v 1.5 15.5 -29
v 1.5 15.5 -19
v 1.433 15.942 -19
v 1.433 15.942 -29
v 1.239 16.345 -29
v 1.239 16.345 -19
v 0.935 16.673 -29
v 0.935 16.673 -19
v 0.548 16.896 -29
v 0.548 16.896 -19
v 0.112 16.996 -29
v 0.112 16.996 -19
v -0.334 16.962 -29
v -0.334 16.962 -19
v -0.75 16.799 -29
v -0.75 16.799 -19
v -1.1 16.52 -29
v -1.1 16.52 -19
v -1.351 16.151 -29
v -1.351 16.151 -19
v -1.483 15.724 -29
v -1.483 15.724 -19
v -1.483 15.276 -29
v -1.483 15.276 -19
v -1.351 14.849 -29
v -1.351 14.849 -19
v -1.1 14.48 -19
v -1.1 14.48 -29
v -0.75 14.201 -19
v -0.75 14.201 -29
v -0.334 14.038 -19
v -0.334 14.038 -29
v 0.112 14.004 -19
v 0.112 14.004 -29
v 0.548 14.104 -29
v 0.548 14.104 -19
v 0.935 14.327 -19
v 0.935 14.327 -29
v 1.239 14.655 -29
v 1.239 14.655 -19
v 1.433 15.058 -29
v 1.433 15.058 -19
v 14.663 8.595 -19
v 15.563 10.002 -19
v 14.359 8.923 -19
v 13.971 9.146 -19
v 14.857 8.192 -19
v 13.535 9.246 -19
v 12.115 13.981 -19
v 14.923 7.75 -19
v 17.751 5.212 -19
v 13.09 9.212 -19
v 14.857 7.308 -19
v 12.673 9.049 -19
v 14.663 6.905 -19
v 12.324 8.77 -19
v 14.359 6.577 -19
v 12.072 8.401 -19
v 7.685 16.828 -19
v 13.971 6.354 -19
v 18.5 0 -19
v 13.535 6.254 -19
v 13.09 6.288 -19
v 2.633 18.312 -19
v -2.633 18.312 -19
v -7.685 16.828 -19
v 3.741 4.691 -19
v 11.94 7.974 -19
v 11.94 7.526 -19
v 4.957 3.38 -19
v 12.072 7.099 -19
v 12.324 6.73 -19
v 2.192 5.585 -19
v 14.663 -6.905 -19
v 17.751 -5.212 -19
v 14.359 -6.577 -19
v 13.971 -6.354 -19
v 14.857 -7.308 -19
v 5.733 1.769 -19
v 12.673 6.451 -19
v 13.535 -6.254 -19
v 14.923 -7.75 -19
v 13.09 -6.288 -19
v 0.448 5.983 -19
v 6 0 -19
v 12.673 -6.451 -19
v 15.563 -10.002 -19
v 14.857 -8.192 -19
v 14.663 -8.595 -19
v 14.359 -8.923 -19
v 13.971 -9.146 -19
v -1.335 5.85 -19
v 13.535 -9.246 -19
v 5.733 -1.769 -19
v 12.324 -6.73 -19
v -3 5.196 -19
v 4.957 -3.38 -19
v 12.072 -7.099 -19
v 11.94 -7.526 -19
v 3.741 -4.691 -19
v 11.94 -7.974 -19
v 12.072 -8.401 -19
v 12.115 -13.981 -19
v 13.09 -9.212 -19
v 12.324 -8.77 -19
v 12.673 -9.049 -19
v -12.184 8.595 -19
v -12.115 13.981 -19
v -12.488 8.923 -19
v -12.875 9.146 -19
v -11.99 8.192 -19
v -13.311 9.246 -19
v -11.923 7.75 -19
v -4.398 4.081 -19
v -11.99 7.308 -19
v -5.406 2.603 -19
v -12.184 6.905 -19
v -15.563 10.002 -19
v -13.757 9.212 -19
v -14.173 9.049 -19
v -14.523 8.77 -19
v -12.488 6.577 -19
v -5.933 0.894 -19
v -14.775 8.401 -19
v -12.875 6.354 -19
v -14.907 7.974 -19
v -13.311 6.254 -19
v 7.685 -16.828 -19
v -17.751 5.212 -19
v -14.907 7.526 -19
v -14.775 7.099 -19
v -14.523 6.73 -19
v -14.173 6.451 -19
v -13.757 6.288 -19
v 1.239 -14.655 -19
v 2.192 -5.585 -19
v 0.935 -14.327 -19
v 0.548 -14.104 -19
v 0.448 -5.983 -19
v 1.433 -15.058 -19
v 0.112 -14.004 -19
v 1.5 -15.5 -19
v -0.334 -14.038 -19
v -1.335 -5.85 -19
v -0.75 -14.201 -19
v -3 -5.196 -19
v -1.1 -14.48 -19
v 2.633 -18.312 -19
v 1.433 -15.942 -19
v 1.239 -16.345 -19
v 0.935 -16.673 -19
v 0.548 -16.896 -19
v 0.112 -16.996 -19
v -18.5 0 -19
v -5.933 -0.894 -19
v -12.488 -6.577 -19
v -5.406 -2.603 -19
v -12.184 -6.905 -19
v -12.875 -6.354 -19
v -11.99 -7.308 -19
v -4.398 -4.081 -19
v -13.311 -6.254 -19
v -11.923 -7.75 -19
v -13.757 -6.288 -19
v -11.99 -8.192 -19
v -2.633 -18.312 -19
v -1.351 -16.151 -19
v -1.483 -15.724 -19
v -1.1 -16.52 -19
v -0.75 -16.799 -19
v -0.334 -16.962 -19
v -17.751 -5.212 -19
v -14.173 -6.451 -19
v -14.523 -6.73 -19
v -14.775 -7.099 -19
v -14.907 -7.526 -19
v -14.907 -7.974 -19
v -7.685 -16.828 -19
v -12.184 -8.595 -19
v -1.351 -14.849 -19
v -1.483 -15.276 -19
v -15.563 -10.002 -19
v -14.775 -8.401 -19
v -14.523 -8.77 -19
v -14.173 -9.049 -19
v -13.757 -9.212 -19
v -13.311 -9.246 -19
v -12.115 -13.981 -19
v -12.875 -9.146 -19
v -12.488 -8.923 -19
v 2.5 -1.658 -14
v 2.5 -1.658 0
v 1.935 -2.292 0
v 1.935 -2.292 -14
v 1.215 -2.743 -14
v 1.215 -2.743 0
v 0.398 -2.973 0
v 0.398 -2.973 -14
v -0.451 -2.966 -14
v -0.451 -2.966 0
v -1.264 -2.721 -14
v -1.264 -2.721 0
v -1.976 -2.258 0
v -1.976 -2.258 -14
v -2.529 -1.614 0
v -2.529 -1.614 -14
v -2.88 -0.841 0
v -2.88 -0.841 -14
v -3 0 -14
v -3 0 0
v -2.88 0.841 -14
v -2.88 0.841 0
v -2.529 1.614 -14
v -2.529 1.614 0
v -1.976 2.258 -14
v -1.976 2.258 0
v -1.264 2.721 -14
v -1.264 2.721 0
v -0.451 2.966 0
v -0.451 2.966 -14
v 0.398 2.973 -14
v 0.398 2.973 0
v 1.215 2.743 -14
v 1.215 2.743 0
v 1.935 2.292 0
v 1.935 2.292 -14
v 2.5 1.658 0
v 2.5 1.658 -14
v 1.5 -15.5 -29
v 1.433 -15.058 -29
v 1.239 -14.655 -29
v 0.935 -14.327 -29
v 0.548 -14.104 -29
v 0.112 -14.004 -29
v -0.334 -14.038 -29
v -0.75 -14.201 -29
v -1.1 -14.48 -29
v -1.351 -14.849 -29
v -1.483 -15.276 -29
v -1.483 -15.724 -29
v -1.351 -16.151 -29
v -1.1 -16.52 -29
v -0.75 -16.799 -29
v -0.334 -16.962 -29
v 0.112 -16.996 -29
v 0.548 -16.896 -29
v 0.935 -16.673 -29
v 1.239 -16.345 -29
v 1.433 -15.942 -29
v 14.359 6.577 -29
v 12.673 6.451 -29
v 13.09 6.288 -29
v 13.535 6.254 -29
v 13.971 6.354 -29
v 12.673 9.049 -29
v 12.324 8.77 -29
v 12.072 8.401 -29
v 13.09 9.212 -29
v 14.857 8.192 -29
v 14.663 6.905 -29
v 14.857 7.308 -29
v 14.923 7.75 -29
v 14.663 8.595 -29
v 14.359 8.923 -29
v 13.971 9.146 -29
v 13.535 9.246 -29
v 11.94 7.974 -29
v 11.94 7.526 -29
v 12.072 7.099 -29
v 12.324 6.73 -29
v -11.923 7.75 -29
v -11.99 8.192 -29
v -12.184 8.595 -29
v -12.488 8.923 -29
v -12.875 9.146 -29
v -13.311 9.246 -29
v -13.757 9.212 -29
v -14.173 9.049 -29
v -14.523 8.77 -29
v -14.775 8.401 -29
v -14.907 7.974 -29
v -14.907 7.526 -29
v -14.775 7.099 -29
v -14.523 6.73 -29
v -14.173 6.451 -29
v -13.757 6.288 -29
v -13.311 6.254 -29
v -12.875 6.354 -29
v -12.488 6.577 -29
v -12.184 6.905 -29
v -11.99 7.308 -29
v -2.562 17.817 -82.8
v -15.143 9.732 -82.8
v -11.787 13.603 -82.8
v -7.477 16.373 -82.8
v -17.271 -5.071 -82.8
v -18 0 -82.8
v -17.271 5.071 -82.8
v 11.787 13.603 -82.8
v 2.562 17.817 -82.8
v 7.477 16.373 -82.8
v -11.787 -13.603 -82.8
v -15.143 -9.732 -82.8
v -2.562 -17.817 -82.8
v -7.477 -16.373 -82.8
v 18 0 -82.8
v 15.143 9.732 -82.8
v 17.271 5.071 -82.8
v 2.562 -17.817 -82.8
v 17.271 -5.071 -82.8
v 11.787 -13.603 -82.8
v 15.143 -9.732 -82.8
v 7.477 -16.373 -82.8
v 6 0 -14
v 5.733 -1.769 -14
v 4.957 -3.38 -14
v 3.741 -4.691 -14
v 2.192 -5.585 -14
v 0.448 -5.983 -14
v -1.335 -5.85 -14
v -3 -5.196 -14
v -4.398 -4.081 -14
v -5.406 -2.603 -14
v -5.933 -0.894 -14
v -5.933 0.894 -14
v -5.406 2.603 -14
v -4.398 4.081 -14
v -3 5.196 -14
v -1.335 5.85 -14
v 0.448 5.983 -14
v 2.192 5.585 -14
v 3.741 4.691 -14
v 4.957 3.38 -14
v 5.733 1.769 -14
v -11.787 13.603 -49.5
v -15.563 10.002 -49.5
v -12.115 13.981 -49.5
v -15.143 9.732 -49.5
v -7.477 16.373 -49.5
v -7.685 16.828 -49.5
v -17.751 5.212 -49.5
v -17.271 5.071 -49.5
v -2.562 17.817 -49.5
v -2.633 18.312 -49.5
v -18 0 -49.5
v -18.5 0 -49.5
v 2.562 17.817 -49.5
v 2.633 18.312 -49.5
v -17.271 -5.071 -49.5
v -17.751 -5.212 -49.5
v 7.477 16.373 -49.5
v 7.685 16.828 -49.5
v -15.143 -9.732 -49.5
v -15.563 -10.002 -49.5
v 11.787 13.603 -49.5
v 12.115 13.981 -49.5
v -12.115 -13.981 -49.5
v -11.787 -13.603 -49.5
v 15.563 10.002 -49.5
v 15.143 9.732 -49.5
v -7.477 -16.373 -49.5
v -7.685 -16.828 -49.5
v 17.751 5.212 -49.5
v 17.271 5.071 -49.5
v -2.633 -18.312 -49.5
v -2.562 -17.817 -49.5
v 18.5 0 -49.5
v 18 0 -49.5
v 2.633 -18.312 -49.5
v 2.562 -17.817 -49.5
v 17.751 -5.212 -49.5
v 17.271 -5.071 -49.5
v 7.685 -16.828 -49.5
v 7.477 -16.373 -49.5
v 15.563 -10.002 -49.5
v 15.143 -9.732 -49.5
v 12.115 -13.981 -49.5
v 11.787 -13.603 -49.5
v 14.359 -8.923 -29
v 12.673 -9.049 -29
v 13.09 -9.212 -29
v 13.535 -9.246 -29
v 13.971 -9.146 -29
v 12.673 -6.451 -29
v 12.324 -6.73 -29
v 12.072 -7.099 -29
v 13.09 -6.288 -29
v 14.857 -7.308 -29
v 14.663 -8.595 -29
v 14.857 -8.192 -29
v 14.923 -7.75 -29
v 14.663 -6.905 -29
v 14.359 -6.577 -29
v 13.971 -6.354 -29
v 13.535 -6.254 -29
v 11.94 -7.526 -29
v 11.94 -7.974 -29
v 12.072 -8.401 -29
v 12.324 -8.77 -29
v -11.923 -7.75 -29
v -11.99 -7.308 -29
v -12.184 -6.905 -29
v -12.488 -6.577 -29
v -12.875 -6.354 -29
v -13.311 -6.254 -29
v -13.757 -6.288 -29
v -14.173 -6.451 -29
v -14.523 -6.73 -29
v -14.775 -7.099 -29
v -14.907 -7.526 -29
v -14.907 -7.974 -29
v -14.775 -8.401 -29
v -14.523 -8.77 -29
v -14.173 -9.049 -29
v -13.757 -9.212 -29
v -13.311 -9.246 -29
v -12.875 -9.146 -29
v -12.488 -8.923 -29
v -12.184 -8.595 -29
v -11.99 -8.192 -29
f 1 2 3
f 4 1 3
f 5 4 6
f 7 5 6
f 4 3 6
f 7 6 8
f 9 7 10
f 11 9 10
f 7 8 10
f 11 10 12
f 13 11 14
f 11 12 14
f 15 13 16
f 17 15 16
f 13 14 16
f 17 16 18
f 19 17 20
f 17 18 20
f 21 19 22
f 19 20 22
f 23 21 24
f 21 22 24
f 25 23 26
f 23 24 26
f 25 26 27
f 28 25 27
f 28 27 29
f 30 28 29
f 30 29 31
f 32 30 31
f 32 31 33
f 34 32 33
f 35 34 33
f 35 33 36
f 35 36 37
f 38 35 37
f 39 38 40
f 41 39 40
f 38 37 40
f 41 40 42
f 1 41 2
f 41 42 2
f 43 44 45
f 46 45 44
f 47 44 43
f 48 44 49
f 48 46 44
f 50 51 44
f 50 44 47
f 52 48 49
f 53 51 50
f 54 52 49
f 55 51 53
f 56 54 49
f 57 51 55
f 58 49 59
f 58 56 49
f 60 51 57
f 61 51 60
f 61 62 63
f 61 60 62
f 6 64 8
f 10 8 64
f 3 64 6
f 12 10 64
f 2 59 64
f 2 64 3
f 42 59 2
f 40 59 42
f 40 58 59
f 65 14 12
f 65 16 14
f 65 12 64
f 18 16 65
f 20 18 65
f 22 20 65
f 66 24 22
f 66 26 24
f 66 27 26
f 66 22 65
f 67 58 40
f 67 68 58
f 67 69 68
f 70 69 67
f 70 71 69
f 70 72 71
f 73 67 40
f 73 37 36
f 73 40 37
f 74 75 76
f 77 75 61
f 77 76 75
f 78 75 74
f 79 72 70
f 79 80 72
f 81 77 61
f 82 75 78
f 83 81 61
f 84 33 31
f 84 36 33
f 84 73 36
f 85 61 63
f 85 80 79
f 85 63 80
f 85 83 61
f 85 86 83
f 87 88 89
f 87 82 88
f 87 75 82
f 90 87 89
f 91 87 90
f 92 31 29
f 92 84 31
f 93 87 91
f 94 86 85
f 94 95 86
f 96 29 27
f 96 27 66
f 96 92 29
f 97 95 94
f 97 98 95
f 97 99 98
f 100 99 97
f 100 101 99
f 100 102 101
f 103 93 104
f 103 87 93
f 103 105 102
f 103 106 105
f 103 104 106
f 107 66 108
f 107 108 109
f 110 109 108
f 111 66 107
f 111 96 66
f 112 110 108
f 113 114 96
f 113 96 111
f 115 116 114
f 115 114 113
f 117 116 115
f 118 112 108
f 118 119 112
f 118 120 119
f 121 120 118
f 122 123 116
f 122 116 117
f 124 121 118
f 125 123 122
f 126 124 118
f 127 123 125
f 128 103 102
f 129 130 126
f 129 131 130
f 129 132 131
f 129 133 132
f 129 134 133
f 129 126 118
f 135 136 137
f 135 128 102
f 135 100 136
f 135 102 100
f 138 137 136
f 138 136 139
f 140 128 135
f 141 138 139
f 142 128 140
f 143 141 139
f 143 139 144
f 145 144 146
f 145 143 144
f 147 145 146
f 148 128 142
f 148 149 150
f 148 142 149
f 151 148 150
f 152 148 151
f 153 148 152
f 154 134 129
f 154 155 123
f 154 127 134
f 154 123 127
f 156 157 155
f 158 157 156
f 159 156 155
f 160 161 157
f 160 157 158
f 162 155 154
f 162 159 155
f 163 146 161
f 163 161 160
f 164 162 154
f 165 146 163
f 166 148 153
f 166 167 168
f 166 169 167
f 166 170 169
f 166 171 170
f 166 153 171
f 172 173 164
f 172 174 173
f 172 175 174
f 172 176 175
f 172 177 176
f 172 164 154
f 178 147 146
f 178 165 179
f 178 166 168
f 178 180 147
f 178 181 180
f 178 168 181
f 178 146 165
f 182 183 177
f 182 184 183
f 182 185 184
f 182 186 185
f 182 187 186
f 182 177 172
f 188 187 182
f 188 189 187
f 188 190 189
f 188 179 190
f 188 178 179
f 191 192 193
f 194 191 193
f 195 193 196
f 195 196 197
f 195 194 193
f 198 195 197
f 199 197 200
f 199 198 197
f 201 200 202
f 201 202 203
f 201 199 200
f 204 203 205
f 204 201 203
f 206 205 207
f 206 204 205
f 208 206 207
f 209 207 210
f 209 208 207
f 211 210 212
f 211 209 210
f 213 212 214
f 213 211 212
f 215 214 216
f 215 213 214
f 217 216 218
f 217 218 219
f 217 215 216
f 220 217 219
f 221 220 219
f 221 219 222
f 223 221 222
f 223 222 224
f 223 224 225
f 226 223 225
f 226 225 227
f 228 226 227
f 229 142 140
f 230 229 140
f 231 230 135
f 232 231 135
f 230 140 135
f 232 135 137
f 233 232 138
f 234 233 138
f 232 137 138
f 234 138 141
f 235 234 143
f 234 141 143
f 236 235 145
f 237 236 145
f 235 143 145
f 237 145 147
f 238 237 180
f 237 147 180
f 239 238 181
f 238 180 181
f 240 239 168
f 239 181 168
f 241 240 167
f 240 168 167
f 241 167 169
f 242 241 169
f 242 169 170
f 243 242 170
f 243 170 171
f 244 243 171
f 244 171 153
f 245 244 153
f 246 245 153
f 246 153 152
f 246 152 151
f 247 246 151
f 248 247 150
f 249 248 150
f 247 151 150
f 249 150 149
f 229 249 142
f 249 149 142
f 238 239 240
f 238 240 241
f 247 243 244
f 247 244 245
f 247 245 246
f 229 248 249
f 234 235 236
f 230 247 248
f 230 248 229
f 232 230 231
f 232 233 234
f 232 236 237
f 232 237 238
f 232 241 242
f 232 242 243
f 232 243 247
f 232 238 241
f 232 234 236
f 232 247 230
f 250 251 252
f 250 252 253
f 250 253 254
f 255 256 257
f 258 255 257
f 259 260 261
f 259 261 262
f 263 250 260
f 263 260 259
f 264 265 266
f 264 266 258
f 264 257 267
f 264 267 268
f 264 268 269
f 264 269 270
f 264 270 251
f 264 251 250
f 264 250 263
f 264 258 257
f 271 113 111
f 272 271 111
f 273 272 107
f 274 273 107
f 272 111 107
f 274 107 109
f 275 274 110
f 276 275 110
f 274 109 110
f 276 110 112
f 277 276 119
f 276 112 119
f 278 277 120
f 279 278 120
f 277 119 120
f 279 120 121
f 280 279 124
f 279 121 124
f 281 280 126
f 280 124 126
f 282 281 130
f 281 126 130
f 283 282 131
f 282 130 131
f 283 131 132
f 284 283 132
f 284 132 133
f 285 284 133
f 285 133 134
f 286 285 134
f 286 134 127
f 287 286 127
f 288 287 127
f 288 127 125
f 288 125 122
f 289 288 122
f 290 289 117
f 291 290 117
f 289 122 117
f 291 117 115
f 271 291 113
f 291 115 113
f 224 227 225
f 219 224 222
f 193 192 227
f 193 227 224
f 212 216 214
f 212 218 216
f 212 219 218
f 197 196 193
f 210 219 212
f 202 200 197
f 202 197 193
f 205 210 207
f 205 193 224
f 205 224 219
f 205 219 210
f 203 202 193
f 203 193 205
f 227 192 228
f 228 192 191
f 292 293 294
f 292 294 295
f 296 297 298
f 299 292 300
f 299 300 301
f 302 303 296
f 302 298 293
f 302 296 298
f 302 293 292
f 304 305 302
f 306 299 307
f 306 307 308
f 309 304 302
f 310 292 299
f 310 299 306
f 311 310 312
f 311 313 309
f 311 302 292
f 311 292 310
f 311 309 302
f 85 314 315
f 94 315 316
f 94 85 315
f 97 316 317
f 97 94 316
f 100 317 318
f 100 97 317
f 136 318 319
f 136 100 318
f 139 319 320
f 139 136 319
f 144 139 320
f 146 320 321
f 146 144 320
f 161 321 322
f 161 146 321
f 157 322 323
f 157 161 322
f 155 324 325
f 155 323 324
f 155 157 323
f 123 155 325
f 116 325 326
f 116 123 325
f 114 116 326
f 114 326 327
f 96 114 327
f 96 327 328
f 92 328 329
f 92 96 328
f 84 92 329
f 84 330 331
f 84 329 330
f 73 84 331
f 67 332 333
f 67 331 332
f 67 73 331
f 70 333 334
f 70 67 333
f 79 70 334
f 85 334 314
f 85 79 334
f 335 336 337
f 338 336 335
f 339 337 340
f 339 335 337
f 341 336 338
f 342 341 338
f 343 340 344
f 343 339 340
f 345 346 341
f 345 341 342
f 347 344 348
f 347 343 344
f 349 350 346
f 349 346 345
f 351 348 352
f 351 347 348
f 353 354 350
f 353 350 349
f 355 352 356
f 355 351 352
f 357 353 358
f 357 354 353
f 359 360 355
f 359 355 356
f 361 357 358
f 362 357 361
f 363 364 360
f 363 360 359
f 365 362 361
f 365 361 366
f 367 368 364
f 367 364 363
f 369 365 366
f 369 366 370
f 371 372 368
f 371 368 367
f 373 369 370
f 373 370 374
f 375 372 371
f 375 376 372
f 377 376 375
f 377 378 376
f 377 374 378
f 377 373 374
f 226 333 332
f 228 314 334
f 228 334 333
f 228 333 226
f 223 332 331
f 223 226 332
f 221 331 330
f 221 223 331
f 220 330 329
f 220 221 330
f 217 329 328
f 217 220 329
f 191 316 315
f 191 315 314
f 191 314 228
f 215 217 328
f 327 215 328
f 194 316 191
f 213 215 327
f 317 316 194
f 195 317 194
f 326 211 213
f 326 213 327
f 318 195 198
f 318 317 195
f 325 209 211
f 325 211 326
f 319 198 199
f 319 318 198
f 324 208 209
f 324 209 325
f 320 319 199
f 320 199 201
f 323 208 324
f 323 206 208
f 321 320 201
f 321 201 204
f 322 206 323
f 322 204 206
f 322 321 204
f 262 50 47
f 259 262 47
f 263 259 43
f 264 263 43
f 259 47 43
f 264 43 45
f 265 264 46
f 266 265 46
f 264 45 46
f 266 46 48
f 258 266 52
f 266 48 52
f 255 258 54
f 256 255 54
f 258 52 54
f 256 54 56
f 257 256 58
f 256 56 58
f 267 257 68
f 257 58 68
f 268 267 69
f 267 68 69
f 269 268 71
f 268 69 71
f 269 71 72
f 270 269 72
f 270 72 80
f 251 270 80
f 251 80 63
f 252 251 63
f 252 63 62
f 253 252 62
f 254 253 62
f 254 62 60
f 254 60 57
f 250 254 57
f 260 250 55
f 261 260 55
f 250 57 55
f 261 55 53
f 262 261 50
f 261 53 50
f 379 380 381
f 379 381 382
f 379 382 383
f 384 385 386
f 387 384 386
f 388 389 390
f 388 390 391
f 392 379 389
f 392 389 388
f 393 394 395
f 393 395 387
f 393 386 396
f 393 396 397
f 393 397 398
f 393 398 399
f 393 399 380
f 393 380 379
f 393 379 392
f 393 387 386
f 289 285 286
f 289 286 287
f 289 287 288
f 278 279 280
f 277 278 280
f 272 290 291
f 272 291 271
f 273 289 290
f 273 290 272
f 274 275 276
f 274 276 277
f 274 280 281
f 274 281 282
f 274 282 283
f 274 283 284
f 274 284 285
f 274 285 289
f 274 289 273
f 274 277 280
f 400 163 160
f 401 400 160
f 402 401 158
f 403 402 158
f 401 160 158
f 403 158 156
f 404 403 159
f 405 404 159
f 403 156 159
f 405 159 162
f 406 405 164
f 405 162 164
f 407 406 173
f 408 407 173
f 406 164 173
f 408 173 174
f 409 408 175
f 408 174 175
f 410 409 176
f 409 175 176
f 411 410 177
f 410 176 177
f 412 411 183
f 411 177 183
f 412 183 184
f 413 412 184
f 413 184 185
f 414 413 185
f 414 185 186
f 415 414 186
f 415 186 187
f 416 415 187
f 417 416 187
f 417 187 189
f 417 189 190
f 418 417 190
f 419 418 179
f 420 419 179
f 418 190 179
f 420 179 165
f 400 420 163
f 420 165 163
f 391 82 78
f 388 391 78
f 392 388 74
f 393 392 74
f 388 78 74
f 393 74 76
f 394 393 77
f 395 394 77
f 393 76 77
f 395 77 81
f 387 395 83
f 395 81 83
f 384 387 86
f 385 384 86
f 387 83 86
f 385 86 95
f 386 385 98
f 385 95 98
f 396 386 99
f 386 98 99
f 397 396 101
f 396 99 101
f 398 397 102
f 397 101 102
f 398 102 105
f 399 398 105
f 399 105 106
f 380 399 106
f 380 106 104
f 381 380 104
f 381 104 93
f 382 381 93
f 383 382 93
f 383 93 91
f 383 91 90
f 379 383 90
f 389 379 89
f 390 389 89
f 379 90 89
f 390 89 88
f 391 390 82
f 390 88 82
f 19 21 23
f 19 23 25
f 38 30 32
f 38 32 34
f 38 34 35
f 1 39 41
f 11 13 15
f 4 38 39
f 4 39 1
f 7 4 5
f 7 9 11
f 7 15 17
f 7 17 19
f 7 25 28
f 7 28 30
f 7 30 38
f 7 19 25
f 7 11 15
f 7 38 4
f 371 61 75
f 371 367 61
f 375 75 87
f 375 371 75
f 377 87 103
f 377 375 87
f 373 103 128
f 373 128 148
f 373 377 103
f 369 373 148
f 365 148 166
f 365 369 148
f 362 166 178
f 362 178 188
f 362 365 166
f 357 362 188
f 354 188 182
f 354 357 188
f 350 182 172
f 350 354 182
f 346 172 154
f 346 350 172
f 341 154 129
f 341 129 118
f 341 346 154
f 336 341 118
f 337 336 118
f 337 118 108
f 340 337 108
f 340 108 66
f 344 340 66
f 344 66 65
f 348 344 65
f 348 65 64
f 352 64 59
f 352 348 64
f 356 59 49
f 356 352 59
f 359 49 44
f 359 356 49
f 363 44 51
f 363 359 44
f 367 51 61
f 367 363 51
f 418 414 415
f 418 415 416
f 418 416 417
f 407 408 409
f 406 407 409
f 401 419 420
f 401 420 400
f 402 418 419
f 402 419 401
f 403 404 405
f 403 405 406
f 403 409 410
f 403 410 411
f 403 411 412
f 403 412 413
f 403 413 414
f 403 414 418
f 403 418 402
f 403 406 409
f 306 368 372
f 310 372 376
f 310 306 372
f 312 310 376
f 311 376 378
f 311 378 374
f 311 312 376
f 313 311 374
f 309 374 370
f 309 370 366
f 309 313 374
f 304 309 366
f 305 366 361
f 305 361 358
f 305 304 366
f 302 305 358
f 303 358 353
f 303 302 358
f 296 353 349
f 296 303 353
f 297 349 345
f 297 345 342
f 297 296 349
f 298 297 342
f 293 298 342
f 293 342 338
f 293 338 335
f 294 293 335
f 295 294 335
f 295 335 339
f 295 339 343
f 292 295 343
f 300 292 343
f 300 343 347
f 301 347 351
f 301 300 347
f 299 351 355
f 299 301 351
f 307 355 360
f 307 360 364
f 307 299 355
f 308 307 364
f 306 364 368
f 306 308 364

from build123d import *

# Parameters (mm, degrees)
SKETCH_2_R               = 1.5
CUT_EXTRUDE_1_DEPTH      = 10
CUT_EXTRUDE_2_DEPTH      = 87.835131139
CUT_EXTRUDE_2_DEPTH_BACK = 87.835131139
SKETCH_3_W               = 1
SKETCH_3_H               = 14


with BuildPart() as part:
    # 草图1 → 旋转1 (revolve)
    with BuildSketch(Plane(origin=(0, 0, 0), x_dir=(0, 0, -1), z_dir=(1, 0, 0)), mode=Mode.PRIVATE) as revolve_1_sk:
        Polygon((0, 0), (0, 3), (14, 3), (14, 6), (19, 6), (19, 18.5), (49.5, 18.5), (49.5, 18), (82.8, 18), (82.8, 0), align=None)
    revolve(revolve_1_sk.sketch.rotate(Axis((0, 0, 0), (0, 0, -1)), 90), axis=Axis((0, 0, 0), (0, 0, -1)))

    # 草图2 → 切除-拉伸1 (cut)
    with BuildSketch(Plane.XY.offset(-19)):
        with Locations((0, 15.5)):
            Circle(SKETCH_2_R)
        with Locations((13.423393759, 7.75)):
            Circle(SKETCH_2_R)
        with Locations((13.423393759, -7.75)):
            Circle(SKETCH_2_R)
        with Locations((0, -15.5)):
            Circle(SKETCH_2_R)
        with Locations((-13.423393759, -7.75)):
            Circle(SKETCH_2_R)
        with Locations((-13.423393759, 7.75)):
            Circle(SKETCH_2_R)
    extrude(amount=-CUT_EXTRUDE_1_DEPTH, mode=Mode.SUBTRACT)

    # 草图3 → 切除-拉伸2 (cut, two sides: drawn at the far end of the back side and taken through both)
    with BuildSketch(Plane(origin=(0, 0, 0), x_dir=(1, 0, 0), z_dir=(0, 1, 0)).offset(-CUT_EXTRUDE_2_DEPTH_BACK)):
        with Locations((3, 7)):
            Rectangle(SKETCH_3_W, SKETCH_3_H)
    extrude(amount=CUT_EXTRUDE_2_DEPTH + CUT_EXTRUDE_2_DEPTH_BACK, mode=Mode.SUBTRACT)


solid = part.part
